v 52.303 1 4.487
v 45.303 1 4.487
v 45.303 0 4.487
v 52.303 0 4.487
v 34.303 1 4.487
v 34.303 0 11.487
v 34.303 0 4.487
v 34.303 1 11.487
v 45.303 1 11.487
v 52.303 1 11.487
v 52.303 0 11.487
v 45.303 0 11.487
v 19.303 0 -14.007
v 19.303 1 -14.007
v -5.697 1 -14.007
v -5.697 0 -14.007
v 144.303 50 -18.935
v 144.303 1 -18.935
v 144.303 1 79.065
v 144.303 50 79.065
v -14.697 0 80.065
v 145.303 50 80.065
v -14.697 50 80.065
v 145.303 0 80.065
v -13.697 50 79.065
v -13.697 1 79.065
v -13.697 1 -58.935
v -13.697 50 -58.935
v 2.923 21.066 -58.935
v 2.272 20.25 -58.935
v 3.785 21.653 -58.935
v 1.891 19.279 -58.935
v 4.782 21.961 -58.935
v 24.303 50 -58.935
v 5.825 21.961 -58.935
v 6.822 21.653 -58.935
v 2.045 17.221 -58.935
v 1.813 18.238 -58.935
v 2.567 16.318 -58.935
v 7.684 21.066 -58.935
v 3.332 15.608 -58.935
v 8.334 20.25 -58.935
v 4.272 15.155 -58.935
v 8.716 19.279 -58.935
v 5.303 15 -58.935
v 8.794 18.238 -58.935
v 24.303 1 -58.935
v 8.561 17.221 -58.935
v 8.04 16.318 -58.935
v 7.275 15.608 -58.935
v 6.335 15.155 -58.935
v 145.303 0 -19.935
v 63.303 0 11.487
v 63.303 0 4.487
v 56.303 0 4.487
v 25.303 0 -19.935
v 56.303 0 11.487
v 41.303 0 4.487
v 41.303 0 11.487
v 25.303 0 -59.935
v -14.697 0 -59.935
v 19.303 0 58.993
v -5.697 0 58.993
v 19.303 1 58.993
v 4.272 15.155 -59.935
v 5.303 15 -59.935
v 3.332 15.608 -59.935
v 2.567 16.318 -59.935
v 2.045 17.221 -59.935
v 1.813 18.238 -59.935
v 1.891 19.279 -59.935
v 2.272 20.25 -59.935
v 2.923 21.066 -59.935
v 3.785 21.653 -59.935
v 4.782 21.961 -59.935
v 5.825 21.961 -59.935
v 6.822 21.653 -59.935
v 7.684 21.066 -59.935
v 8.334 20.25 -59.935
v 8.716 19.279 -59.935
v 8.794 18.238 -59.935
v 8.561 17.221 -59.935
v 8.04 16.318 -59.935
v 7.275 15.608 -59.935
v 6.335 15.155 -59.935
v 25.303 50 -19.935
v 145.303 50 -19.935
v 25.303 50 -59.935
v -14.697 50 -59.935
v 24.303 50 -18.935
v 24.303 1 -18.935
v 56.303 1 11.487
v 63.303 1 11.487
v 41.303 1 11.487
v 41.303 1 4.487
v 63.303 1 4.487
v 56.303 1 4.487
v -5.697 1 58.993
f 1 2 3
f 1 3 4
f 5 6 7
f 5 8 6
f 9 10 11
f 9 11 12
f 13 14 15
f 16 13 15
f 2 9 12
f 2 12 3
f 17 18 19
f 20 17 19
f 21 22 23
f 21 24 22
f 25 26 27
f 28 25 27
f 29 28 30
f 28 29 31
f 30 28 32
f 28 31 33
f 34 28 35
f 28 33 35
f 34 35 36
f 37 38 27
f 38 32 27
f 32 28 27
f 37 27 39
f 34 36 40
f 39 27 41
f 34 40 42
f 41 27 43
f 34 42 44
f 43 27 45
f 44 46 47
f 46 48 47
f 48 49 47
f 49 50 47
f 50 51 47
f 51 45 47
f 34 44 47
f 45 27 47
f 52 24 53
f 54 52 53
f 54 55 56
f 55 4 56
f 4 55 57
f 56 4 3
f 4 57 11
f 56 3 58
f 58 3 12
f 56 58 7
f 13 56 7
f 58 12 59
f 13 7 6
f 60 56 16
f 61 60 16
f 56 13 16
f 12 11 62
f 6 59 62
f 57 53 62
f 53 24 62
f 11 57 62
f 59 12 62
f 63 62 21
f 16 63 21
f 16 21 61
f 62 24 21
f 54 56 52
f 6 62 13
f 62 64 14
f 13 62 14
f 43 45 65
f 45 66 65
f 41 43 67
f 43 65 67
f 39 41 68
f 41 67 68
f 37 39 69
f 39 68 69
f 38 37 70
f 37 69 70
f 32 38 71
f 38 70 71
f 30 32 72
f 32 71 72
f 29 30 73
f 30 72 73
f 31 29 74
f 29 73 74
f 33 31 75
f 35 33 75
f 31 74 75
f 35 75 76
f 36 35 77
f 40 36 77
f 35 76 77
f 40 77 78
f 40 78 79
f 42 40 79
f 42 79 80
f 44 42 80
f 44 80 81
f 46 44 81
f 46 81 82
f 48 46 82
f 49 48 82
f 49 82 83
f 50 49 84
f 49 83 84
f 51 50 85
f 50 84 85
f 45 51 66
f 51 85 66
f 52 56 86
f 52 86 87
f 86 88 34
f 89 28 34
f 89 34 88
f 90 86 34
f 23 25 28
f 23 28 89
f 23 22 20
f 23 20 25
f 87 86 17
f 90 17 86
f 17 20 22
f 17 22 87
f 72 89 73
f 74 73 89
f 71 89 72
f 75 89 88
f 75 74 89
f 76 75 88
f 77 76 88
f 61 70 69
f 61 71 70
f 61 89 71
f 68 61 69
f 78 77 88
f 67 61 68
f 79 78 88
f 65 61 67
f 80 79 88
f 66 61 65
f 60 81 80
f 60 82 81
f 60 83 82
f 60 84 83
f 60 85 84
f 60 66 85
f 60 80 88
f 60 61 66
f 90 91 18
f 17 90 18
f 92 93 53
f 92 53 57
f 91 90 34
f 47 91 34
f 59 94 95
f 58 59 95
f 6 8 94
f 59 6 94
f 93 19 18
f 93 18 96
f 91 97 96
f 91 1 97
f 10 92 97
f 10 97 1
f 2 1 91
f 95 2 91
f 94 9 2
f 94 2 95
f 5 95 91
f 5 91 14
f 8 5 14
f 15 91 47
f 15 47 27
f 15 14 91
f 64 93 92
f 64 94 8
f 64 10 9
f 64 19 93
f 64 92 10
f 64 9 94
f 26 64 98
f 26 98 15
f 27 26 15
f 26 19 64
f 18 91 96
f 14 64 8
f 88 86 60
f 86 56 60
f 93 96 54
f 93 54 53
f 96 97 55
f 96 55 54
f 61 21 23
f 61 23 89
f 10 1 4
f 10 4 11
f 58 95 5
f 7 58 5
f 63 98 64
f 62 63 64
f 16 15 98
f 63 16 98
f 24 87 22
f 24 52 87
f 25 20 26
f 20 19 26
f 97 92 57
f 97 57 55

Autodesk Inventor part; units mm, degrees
ref_plane "YZ Plane" through (0, 0, 0) normal (1, 0, 0) x (0, 1, 0)
ref_plane "XZ Plane" through (0, 0, 0) normal (0, 1, 0) x (-1, 0, 0)
ref_plane "XY Plane" through (0, 0, 0) normal (0, 0, 1) x (1, 0, 0)
sketch "Szkic1" plane through (0, 0, 0) normal (0, 1, 0) x (-1, 0, 0)
  line L0 (-25.3033, -19.9346) -> (-145.3033, -19.9346)
  line L1 (-145.3033, -19.9346) -> (-145.3033, 80.0654)
  line L2 (-145.3033, 80.0654) -> (14.6967, 80.0654)
  line L3 (14.6967, 80.0654) -> (14.6967, -19.9346)
  line L4 (-25.3033, -19.9346) -> (-25.3033, -59.9346)
  line L5 (14.6967, -59.9346) -> (14.6967, -19.9346)
  line L6 (-1.3707, 111.6296) -> (-1.3707, 118.6296)
  line L7 (-1.3707, 118.6296) -> (-30.3707, 118.6296)
  line L8 (-30.3707, 118.6296) -> (-30.3707, 111.6296)
  line L9 (-1.3707, 111.6296) -> (-30.3707, 111.6296)
  line L10 (14.6967, -59.9346) -> (-25.3033, -59.9346)
  point P0 (0, 0)
  dimension "d0" = 160
  dimension "d1" = 100
  dimension "d2" = 40
  dimension "d3" = 40
  dimension "d9" = 7
  dimension "d39" = 100
extrude "Wyciągnięcie proste1" add sketch "Szkic1" along normal blind 50 contours L0 L1 L2 L3 L5 L10 L4
shell "Skorupa1" thickness 1 removed faces 1 at (51.9699, 50, 46.732)
sketch "Szkic2" plane through (-13.6967, 1, -58.9346) normal (0, 0, 1) x (1, 0, 0)
  line L0 (-1, -1) -> (-1, 49) projected
  line L1 (39, -1) -> (39, 49) projected
  line L2 (-1, -1) -> (39, -1)
  line L3 (39, -1) -> (39, 36)
  line L4 (39, 36) -> (4.775, 36)
  line L5 (4.775, 36) -> (39, -1)
  line L6 (-1, -1) -> (39, 36)
  point P0 (13.6967, -1)
  point P1 (19, 17.5)
  dimension "d20" = 37
hole "Otwór1" at (5.3033, 18.5, -58.9346) direction (0, 0, -1) diameter 7 end through all
sketch "Szkic3" plane through (-13.6967, 1, 79.0654) normal (0, 1, 0) x (1, 0, 0)
  line L0 (158, 98) -> (38, 98) projected
  line L1 (38, 98) -> (0, 98)
  line L2 (0, 0) -> (0, 138) projected
  line L3 (0, 98) -> (1, 98)
  line L4 (0, 93.0725) -> (8, 93.0725)
  line L5 (8, 93.0725) -> (8, 20.0725)
  line L6 (8, 20.0725) -> (33, 20.0725)
  line L7 (33, 20.0725) -> (33, 93.0725)
  line L8 (33, 93.0725) -> (8, 93.0725)
  line L9 (8, 20.0725) -> (8, 0.0725)
  dimension "d41" = 73
  dimension "d42" = 25
  dimension "d43" = 20
extrude "Wyciągnięcie proste2" cut sketch "Szkic3" against normal blind 10
sketch "Szkic4" plane through (-13.6967, 1, 79.0654) normal (0, 1, 0) x (1, 0, 0)
  line L0 (33, 20.0725) -> (33, 93.0725) projected
  line L1 (33, 82.5783) -> (33, 67.5783)
  line L2 (33, 67.5783) -> (48, 67.5783)
  line L3 (48, 67.5783) -> (48, 74.5783)
  line L4 (48, 67.5783) -> (55, 67.5783)
  line L5 (55, 67.5783) -> (55, 74.5783)
  line L6 (55, 74.5783) -> (48, 74.5783)
  line L7 (48, 74.5783) -> (48, 67.5783)
  line L8 (55, 67.5783) -> (59, 67.5783)
  line L9 (59, 67.5783) -> (59, 74.5783)
  line L10 (59, 74.5783) -> (66, 74.5783)
  line L11 (66, 74.5783) -> (66, 67.5783)
  line L12 (66, 67.5783) -> (59, 67.5783)
  line L13 (66, 67.5783) -> (70, 67.5783)
  line L14 (70, 67.5783) -> (70, 74.5783)
  line L15 (70, 74.5783) -> (77, 74.5783)
  line L16 (77, 74.5783) -> (77, 67.5783)
  line L17 (77, 67.5783) -> (70, 67.5783)
  point P0 (48, 74.5783)
  dimension "d46" = 15
  dimension "d47" = 15
  dimension "d48" = 7
  dimension "d49" = 7
  dimension "d50" = 4
  dimension "d51" = 7
  dimension "d52" = 4
  dimension "d53" = 7
extrude "Wyciągnięcie proste3" cut sketch "Szkic4" against normal blind 10 contours L3 L6 L5 L4
extrude "Wyciągnięcie proste4" cut sketch "Szkic4" against normal blind 10 contours L14 L15 L16 L17 | L9 L10 L11 L12
properties part number "obudowatuner"
